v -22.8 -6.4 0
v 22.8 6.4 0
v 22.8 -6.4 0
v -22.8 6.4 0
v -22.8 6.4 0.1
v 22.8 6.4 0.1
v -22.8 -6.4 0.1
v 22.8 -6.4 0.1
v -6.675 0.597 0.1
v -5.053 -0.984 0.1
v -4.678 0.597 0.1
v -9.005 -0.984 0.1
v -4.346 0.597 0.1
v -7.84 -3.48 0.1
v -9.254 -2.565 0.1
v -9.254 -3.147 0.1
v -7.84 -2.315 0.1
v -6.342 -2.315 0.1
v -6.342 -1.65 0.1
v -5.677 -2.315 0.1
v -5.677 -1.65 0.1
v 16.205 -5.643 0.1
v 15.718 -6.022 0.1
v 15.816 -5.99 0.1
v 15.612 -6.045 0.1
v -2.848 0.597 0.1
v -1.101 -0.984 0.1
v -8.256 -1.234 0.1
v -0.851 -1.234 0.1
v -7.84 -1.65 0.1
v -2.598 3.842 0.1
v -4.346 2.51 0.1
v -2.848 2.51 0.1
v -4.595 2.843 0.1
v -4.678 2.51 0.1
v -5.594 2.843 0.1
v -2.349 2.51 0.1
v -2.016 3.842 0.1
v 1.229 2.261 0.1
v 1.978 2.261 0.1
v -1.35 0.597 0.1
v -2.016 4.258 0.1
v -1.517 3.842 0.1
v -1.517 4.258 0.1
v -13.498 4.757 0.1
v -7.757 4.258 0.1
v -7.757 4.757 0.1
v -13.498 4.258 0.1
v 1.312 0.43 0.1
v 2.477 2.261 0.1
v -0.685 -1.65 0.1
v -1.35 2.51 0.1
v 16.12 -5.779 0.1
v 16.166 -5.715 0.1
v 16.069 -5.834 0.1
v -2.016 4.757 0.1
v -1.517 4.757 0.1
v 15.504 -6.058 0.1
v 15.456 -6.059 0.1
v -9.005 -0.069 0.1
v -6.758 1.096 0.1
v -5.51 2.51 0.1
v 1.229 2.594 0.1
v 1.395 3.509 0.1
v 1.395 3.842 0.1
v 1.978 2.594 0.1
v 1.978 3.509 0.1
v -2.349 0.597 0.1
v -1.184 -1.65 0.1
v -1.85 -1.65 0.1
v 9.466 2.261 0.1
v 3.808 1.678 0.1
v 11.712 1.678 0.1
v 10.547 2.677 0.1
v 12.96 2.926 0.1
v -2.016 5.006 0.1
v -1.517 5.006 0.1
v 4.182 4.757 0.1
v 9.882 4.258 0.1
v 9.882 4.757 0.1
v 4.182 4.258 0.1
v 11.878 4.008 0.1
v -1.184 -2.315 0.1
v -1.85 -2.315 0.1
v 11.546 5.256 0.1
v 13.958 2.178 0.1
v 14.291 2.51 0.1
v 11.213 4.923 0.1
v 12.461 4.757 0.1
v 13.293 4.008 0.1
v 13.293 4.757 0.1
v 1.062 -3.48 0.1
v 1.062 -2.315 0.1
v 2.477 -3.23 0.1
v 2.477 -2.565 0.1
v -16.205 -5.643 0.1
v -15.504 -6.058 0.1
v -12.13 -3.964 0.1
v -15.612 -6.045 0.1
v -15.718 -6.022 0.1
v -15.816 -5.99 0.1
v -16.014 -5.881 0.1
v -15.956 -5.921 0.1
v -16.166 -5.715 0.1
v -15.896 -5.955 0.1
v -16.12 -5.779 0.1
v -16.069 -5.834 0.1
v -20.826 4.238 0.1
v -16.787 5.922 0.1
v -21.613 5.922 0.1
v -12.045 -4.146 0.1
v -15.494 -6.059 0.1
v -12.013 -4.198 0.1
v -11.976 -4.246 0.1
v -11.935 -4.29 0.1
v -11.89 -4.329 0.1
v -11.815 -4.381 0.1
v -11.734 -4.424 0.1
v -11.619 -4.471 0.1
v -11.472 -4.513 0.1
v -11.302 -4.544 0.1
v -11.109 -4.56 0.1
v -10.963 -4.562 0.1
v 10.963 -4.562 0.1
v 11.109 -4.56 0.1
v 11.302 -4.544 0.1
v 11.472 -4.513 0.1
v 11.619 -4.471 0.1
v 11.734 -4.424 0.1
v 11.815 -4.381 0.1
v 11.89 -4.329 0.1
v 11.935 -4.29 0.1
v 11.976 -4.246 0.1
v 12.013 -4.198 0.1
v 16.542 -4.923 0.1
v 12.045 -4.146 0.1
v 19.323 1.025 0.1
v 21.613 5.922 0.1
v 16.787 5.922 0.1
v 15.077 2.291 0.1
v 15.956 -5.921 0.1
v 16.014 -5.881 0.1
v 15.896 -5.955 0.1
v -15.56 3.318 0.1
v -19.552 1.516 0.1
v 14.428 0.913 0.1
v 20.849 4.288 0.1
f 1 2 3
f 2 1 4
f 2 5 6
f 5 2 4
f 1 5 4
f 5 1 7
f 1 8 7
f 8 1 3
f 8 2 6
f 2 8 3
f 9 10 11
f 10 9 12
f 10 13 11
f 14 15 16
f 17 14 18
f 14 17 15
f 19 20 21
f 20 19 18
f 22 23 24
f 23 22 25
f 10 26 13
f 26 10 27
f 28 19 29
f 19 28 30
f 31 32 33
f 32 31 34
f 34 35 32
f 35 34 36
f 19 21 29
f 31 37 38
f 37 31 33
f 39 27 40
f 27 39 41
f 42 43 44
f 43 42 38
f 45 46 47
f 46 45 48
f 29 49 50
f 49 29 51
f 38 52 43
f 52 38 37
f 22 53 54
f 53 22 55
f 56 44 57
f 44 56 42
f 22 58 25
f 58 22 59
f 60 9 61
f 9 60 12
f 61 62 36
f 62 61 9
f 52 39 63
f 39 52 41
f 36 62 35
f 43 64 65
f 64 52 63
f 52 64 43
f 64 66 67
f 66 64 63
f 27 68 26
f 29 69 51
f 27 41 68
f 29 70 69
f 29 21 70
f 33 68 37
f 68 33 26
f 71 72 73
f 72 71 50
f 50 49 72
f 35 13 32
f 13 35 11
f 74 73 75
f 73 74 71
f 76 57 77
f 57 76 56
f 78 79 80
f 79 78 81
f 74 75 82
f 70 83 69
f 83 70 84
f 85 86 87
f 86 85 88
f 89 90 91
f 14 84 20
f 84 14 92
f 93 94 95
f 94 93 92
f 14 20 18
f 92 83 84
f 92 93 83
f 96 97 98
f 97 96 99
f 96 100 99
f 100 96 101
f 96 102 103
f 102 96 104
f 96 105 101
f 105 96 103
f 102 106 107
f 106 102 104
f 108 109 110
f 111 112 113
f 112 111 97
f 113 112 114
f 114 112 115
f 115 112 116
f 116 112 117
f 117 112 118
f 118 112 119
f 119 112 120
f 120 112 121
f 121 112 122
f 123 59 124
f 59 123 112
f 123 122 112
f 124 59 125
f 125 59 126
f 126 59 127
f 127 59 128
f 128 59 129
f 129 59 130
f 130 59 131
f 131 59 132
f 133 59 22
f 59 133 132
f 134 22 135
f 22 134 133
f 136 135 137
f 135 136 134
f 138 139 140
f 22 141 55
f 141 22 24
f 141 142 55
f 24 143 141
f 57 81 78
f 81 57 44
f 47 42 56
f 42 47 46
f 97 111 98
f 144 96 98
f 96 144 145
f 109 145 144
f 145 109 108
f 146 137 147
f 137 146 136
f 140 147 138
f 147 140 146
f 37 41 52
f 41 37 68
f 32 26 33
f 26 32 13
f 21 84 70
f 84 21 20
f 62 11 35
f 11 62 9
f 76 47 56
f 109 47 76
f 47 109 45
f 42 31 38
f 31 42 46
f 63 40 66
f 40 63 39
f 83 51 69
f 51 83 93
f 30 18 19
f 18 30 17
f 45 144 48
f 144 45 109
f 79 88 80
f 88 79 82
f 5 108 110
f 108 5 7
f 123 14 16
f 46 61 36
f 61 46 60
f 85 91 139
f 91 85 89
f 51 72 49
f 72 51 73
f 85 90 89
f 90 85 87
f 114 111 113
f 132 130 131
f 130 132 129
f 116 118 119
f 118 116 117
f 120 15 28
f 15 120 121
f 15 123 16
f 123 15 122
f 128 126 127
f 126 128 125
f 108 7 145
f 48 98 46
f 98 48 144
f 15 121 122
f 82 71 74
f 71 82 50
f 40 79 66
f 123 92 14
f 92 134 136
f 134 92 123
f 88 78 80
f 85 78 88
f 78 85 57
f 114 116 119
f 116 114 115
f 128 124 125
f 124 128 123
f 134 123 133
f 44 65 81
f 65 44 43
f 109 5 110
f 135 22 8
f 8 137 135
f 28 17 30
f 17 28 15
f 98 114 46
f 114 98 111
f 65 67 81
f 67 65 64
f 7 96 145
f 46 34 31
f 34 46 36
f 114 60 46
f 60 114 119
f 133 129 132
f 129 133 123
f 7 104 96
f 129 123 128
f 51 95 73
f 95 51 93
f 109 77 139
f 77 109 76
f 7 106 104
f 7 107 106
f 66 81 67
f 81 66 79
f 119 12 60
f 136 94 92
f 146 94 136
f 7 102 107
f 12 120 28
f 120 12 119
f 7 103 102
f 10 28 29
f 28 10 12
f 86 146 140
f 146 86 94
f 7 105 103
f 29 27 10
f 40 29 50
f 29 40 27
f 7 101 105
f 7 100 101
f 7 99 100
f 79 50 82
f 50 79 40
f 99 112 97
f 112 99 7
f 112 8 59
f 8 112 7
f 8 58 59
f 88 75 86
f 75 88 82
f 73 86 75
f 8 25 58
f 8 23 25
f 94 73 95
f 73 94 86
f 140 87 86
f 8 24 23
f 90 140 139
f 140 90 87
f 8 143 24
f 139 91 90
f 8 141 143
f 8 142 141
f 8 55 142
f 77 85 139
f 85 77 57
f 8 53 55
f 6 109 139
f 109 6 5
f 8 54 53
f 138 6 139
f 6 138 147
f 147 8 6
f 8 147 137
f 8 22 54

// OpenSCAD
// file: ../p/box5-12.scad
use <../lib.scad>
function ldraw_lib__box5_12() = [
// 0 Box with 5 Faces without Any Edges
// 0 Name: box5-12.dat
// 0 Author: Chris Dee [cwdee]
// 0 !LDRAW_ORG Primitive UPDATE 2009-02
// 0 !LICENSE Licensed under CC BY 2.0 and CC BY 4.0 : see CAreadme.txt
// 
// 0 BFC CERTIFY CCW
  [0,"BFC","CERTIFY"],
  [0,"BFC","CCW"],
// 
// 0 !HISTORY 2009-09-03 [PTadmin] Official Update 2009-02
// 
// 
// 4 16 1 1 1 1 1 -1 -1 1 -1 -1 1 1
  [4,16,1,1,1,1,1,-1,-1,1,-1,-1,1,1],
// 4 16 -1 0 1 1 0 1 1 1 1 -1 1 1
  [4,16,-1,0,1,1,0,1,1,1,1,-1,1,1],
// 4 16 -1 0 -1 -1 0 1 -1 1 1 -1 1 -1
  [4,16,-1,0,-1,-1,0,1,-1,1,1,-1,1,-1],
// 4 16 1 0 -1 -1 0 -1 -1 1 -1 1 1 -1
  [4,16,1,0,-1,-1,0,-1,-1,1,-1,1,1,-1],
// 4 16 1 0 1 1 0 -1 1 1 -1 1 1 1
  [4,16,1,0,1,1,0,-1,1,1,-1,1,1,1],
// 0
];
module ldraw_lib__box5_12(step=0, col=false, unit=2/5, alt=false, line=0.2, solid=!$preview)
    makepoly(ldraw_lib__box5_12(), step=step, col=col, unit=unit, alt=alt, line=line, solid=solid);
ldraw_lib__box5_12(line=0.2);
// main file
use <../lib.scad>
use <../p/box5-12.scad>
function ldraw_lib__193445a() = [
// 0 Sticker  1.6 x  5.7 with Red Helicopter
// 0 Name: 193445a.dat
// 0 Author: Ulrich Röder [UR]
// 0 !LDRAW_ORG Part UPDATE 2018-02
// 0 !LICENSE Licensed under CC BY 2.0 and CC BY 4.0 : see CAreadme.txt
// 
// 0 BFC CERTIFY CCW
  [0,"BFC","CERTIFY"],
  [0,"BFC","CCW"],
// 
// 0 !KEYWORDS Set 5590
// 
// 0 !HISTORY 2018-12-08 [PTadmin] Official Update 2018-02
// 
// 
// 0 // Main
// 
// 1 16 0 -0.25 0 57 0 0 0 0.25 0 0 0 16 box5-12.dat
  [1,16,0,-0.25,0,57,0,0,0,0.25,0,0,0,16, ldraw_lib__box5_12()],
// 
// 0 // Red
// 4 4 -12.632 -.25 -2.46 -11.696 -.25 1.492 -16.688 -.25 1.492 -22.512 -.25 -2.46
  [4,4,-12.632,-.25,-2.46,-11.696,-.25,1.492,-16.688,-.25,1.492,-22.512,-.25,-2.46],
// 3 4 -12.632 -0.25 -2.46 -10.864 -0.25 1.492 -11.696 -0.25 1.492
  [3,4,-12.632,-0.25,-2.46,-10.864,-0.25,1.492,-11.696,-0.25,1.492],
// 3 4 -19.6 -0.25 -8.7 -23.136 -0.25 -6.412 -23.136 -0.25 -7.868
  [3,4,-19.6,-0.25,-8.7,-23.136,-0.25,-6.412,-23.136,-0.25,-7.868],
// 4 4 -19.6 -.25 -5.788 -23.136 -.25 -6.412 -19.6 -.25 -8.7 -15.856 -.25 -5.788
  [4,4,-19.6,-.25,-5.788,-23.136,-.25,-6.412,-19.6,-.25,-8.7,-15.856,-.25,-5.788],
// 4 4 -15.856 -.25 -5.788 -14.192 -.25 -5.788 -14.192 -.25 -4.124 -15.856 -.25 -4.124
  [4,4,-15.856,-.25,-5.788,-14.192,-.25,-5.788,-14.192,-.25,-4.124,-15.856,-.25,-4.124],
// 4 4 39.295 -.25 -15.056 39.539 -.25 -14.976 40.512 -.25 -14.108 39.029 -.25 -15.113
  [4,4,39.295,-.25,-15.056,39.539,-.25,-14.976,40.512,-.25,-14.108,39.029,-.25,-15.113],
// 4 4 -12.632 -.25 -2.46 -2.752 -.25 -2.46 -7.12 -.25 1.492 -10.864 -.25 1.492
  [4,4,-12.632,-.25,-2.46,-2.752,-.25,-2.46,-7.12,-.25,1.492,-10.864,-.25,1.492],
// 4 4 -15.856 -.25 -4.124 -2.128 -.25 -3.084 -20.64 -.25 -3.084 -19.6 -.25 -4.124
  [4,4,-15.856,-.25,-4.124,-2.128,-.25,-3.084,-20.64,-.25,-3.084,-19.6,-.25,-4.124],
// 4 4 -7.12 -.25 6.276 -6.496 -.25 9.604 -11.488 -.25 7.108 -10.864 -.25 6.276
  [4,4,-7.12,-.25,6.276,-6.496,-.25,9.604,-11.488,-.25,7.108,-10.864,-.25,6.276],
// 4 4 -11.696 -.25 6.276 -10.864 -.25 6.276 -11.488 -.25 7.108 -13.984 -.25 7.108
  [4,4,-11.696,-.25,6.276,-10.864,-.25,6.276,-11.488,-.25,7.108,-13.984,-.25,7.108],
// 3 4 -15.856 -0.25 -4.124 -14.192 -0.25 -4.124 -2.128 -0.25 -3.084
  [3,4,-15.856,-0.25,-4.124,-14.192,-0.25,-4.124,-2.128,-0.25,-3.084],
// 4 4 -6.496 -.25 9.604 -7.12 -.25 6.276 -5.872 -.25 6.276 -5.04 -.25 9.604
  [4,4,-6.496,-.25,9.604,-7.12,-.25,6.276,-5.872,-.25,6.276,-5.04,-.25,9.604],
// 4 4 3.072 -.25 5.652 -3.376 -.25 1.492 -2.752 -.25 -2.46 4.944 -.25 5.652
  [4,4,3.072,-.25,5.652,-3.376,-.25,1.492,-2.752,-.25,-2.46,4.944,-.25,5.652],
// 4 4 -5.04 -.25 9.604 -3.792 -.25 9.604 -3.792 -.25 10.644 -5.04 -.25 10.644
  [4,4,-5.04,-.25,9.604,-3.792,-.25,9.604,-3.792,-.25,10.644,-5.04,-.25,10.644],
// 4 4 -19.393 -.25 10.644 -19.393 -.25 11.892 -33.744 -.25 11.892 -33.744 -.25 10.644
  [4,4,-19.393,-.25,10.644,-19.393,-.25,11.892,-33.744,-.25,11.892,-33.744,-.25,10.644],
// 4 4 -2.128 -.25 -3.084 -1.712 -.25 -4.124 3.28 -.25 1.076 6.192 -.25 5.652
  [4,4,-2.128,-.25,-3.084,-1.712,-.25,-4.124,3.28,-.25,1.076,6.192,-.25,5.652],
// 4 4 -3.376 -.25 6.276 -3.792 -.25 9.604 -5.04 -.25 9.604 -5.872 -.25 6.276
  [4,4,-3.376,-.25,6.276,-3.792,-.25,9.604,-5.04,-.25,9.604,-5.872,-.25,6.276],
// 4 4 40.173 -.25 -14.584 40.3 -.25 -14.447 40.414 -.25 -14.288 40.512 -.25 -14.108
  [4,4,40.173,-.25,-14.584,40.3,-.25,-14.447,40.414,-.25,-14.288,40.512,-.25,-14.108],
// 4 4 -5.04 -.25 11.892 -5.04 -.25 10.644 -3.792 -.25 10.644 -3.792 -.25 11.892
  [4,4,-5.04,-.25,11.892,-5.04,-.25,10.644,-3.792,-.25,10.644,-3.792,-.25,11.892],
// 4 4 40.512 -.25 -14.108 38.64 -.25 -15.148 38.761 -.25 -15.144 39.029 -.25 -15.113
  [4,4,40.512,-.25,-14.108,38.64,-.25,-15.148,38.761,-.25,-15.144,39.029,-.25,-15.113],
// 4 4 -22.512 -.25 -.172 -22.512 -.25 -2.46 -16.688 -.25 1.492 -16.896 -.25 2.74
  [4,4,-22.512,-.25,-.172,-22.512,-.25,-2.46,-16.688,-.25,1.492,-16.896,-.25,2.74],
// 4 4 -13.776 -.25 6.276 -13.984 -.25 7.108 -16.896 -.25 2.74 -16.688 -.25 1.492
  [4,4,-13.776,-.25,6.276,-13.984,-.25,7.108,-16.896,-.25,2.74,-16.688,-.25,1.492],
// 4 4 3.072 -.25 5.652 3.072 -.25 6.484 -3.376 -.25 6.276 -3.376 -.25 1.492
  [4,4,3.072,-.25,5.652,3.072,-.25,6.484,-3.376,-.25,6.276,-3.376,-.25,1.492],
// 3 4 -13.984 -0.25 7.108 -13.776 -0.25 6.276 -11.696 -0.25 6.276
  [3,4,-13.984,-0.25,7.108,-13.776,-0.25,6.276,-11.696,-0.25,6.276],
// 3 4 -3.792 -0.25 9.604 3.488 -0.25 8.772 3.488 -0.25 9.604
  [3,4,-3.792,-0.25,9.604,3.488,-0.25,8.772,3.488,-0.25,9.604],
// 4 4 3.488 -.25 8.772 -3.792 -.25 9.604 -3.376 -.25 6.276 3.072 -.25 6.484
  [4,4,3.488,-.25,8.772,-3.792,-.25,9.604,-3.376,-.25,6.276,3.072,-.25,6.484],
// 4 4 4.944 -.25 6.484 4.944 -.25 8.772 3.488 -.25 8.772 3.072 -.25 6.484
  [4,4,4.944,-.25,6.484,4.944,-.25,8.772,3.488,-.25,8.772,3.072,-.25,6.484],
// 3 4 -2.752 -0.25 -2.46 -5.872 -0.25 1.492 -7.12 -0.25 1.492
  [3,4,-2.752,-0.25,-2.46,-5.872,-0.25,1.492,-7.12,-0.25,1.492],
// 3 4 -2.128 -0.25 -3.084 -2.96 -0.25 -4.124 -1.712 -0.25 -4.124
  [3,4,-2.128,-0.25,-3.084,-2.96,-0.25,-4.124,-1.712,-0.25,-4.124],
// 3 4 -2.752 -0.25 -2.46 -3.376 -0.25 1.492 -5.872 -0.25 1.492
  [3,4,-2.752,-0.25,-2.46,-3.376,-0.25,1.492,-5.872,-0.25,1.492],
// 3 4 -2.128 -0.25 -3.084 -4.624 -0.25 -4.124 -2.96 -0.25 -4.124
  [3,4,-2.128,-0.25,-3.084,-4.624,-0.25,-4.124,-2.96,-0.25,-4.124],
// 3 4 -2.128 -0.25 -3.084 -14.192 -0.25 -4.124 -4.624 -0.25 -4.124
  [3,4,-2.128,-0.25,-3.084,-14.192,-0.25,-4.124,-4.624,-0.25,-4.124],
// 4 4 -5.872 -.25 1.492 -5.872 -.25 6.276 -7.12 -.25 6.276 -7.12 -.25 1.492
  [4,4,-5.872,-.25,1.492,-5.872,-.25,6.276,-7.12,-.25,6.276,-7.12,-.25,1.492],
// 4 4 29.28 -.25 4.196 23.664 -.25 5.652 6.192 -.25 5.652 9.52 -.25 4.196
  [4,4,29.28,-.25,4.196,23.664,-.25,5.652,6.192,-.25,5.652,9.52,-.25,4.196],
// 3 4 6.192 -0.25 5.652 3.28 -0.25 1.076 9.52 -0.25 4.196
  [3,4,6.192,-0.25,5.652,3.28,-0.25,1.076,9.52,-0.25,4.196],
// 4 4 -11.696 -.25 6.276 -11.696 -.25 1.492 -10.864 -.25 1.492 -10.864 -.25 6.276
  [4,4,-11.696,-.25,6.276,-11.696,-.25,1.492,-10.864,-.25,1.492,-10.864,-.25,6.276],
// 4 4 26.368 -.25 6.692 23.664 -.25 5.652 29.28 -.25 4.196 32.4 -.25 7.316
  [4,4,26.368,-.25,6.692,23.664,-.25,5.652,29.28,-.25,4.196,32.4,-.25,7.316],
// 4 4 -5.04 -.25 11.892 -3.792 -.25 11.892 -3.792 -.25 12.516 -5.04 -.25 12.516
  [4,4,-5.04,-.25,11.892,-3.792,-.25,11.892,-3.792,-.25,12.516,-5.04,-.25,12.516],
// 4 4 10.456 -.25 11.892 10.456 -.25 10.644 24.704 -.25 10.644 24.704 -.25 11.892
  [4,4,10.456,-.25,11.892,10.456,-.25,10.644,24.704,-.25,10.644,24.704,-.25,11.892],
// 3 4 26.368 -0.25 6.692 32.4 -0.25 7.316 29.696 -0.25 10.02
  [3,4,26.368,-0.25,6.692,32.4,-0.25,7.316,29.696,-0.25,10.02],
// 4 4 -2.96 -.25 -4.124 -4.624 -.25 -4.124 -4.624 -.25 -5.788 -2.96 -.25 -5.788
  [4,4,-2.96,-.25,-4.124,-4.624,-.25,-4.124,-4.624,-.25,-5.788,-2.96,-.25,-5.788],
// 4 4 34.896 -.25 5.444 35.728 -.25 6.276 28.864 -.25 13.14 28.032 -.25 12.308
  [4,4,34.896,-.25,5.444,35.728,-.25,6.276,28.864,-.25,13.14,28.032,-.25,12.308],
// 3 4 31.152 -0.25 11.892 33.232 -0.25 10.02 33.232 -0.25 11.892
  [3,4,31.152,-0.25,11.892,33.232,-0.25,10.02,33.232,-0.25,11.892],
// 4 4 -4.624 -.25 -5.788 -14.192 -.25 -5.788 -19.6 -.25 -8.7 2.656 -.25 -8.7
  [4,4,-4.624,-.25,-5.788,-14.192,-.25,-5.788,-19.6,-.25,-8.7,2.656,-.25,-8.7],
// 4 4 6.192 -.25 -6.412 2.656 -.25 -5.788 2.656 -.25 -8.7 6.192 -.25 -8.076
  [4,4,6.192,-.25,-6.412,2.656,-.25,-5.788,2.656,-.25,-8.7,6.192,-.25,-8.076],
// 3 4 -19.6 -0.25 -8.7 -14.192 -0.25 -5.788 -15.856 -0.25 -5.788
  [3,4,-19.6,-0.25,-8.7,-14.192,-0.25,-5.788,-15.856,-0.25,-5.788],
// 3 4 2.656 -0.25 -8.7 -2.96 -0.25 -5.788 -4.624 -0.25 -5.788
  [3,4,2.656,-0.25,-8.7,-2.96,-0.25,-5.788,-4.624,-0.25,-5.788],
// 3 4 2.656 -0.25 -8.7 2.656 -0.25 -5.788 -2.96 -0.25 -5.788
  [3,4,2.656,-0.25,-8.7,2.656,-0.25,-5.788,-2.96,-0.25,-5.788],
// 4 4 -30.325 -.25 -9.911 -40.512 -.25 -14.108 -39.029 -.25 -15.113 -38.761 -.25 -15.144
  [4,4,-30.325,-.25,-9.911,-40.512,-.25,-14.108,-39.029,-.25,-15.113,-38.761,-.25,-15.144],
// 4 4 -39.029 -.25 -15.113 -40.512 -.25 -14.108 -39.539 -.25 -14.976 -39.295 -.25 -15.056
  [4,4,-39.029,-.25,-15.113,-40.512,-.25,-14.108,-39.539,-.25,-14.976,-39.295,-.25,-15.056],
// 4 4 -40.414 -.25 -14.288 -40.035 -.25 -14.702 -39.89 -.25 -14.803 -40.512 -.25 -14.108
  [4,4,-40.414,-.25,-14.288,-40.035,-.25,-14.702,-39.89,-.25,-14.803,-40.512,-.25,-14.108],
// 4 4 -39.539 -.25 -14.976 -40.512 -.25 -14.108 -39.89 -.25 -14.803 -39.74 -.25 -14.887
  [4,4,-39.539,-.25,-14.976,-40.512,-.25,-14.108,-39.89,-.25,-14.803,-39.74,-.25,-14.887],
// 4 4 -40.173 -.25 -14.584 -40.035 -.25 -14.702 -40.414 -.25 -14.288 -40.3 -.25 -14.447
  [4,4,-40.173,-.25,-14.584,-40.035,-.25,-14.702,-40.414,-.25,-14.288,-40.3,-.25,-14.447],
// 3 4 -52.064 -0.25 10.596 -41.968 -0.25 14.804 -54.032 -0.25 14.804
  [3,4,-52.064,-0.25,10.596,-41.968,-0.25,14.804,-54.032,-0.25,14.804],
// 4 4 -38.736 -.25 -15.148 -30.033 -.25 -10.495 -30.112 -.25 -10.364 -38.761 -.25 -15.144
  [4,4,-38.736,-.25,-15.148,-30.033,-.25,-10.495,-30.112,-.25,-10.364,-38.761,-.25,-15.144],
// 3 4 -30.033 -0.25 -10.495 -38.736 -0.25 -15.148 -29.941 -0.25 -10.615
  [3,4,-30.033,-0.25,-10.495,-38.736,-0.25,-15.148,-29.941,-0.25,-10.615],
// 3 4 -29.941 -0.25 -10.615 -38.736 -0.25 -15.148 -29.838 -0.25 -10.724
  [3,4,-29.941,-0.25,-10.615,-38.736,-0.25,-15.148,-29.838,-0.25,-10.724],
// 3 4 -29.838 -0.25 -10.724 -38.736 -0.25 -15.148 -29.724 -0.25 -10.823
  [3,4,-29.838,-0.25,-10.724,-38.736,-0.25,-15.148,-29.724,-0.25,-10.823],
// 3 4 -29.724 -0.25 -10.823 -38.736 -0.25 -15.148 -29.537 -0.25 -10.952
  [3,4,-29.724,-0.25,-10.823,-38.736,-0.25,-15.148,-29.537,-0.25,-10.952],
// 3 4 -29.537 -0.25 -10.952 -38.736 -0.25 -15.148 -29.334 -0.25 -11.061
  [3,4,-29.537,-0.25,-10.952,-38.736,-0.25,-15.148,-29.334,-0.25,-11.061],
// 3 4 -29.334 -0.25 -11.061 -38.736 -0.25 -15.148 -29.048 -0.25 -11.177
  [3,4,-29.334,-0.25,-11.061,-38.736,-0.25,-15.148,-29.048,-0.25,-11.177],
// 3 4 -29.048 -0.25 -11.177 -38.736 -0.25 -15.148 -28.681 -0.25 -11.282
  [3,4,-29.048,-0.25,-11.177,-38.736,-0.25,-15.148,-28.681,-0.25,-11.282],
// 3 4 -28.681 -0.25 -11.282 -38.736 -0.25 -15.148 -28.255 -0.25 -11.359
  [3,4,-28.681,-0.25,-11.282,-38.736,-0.25,-15.148,-28.255,-0.25,-11.359],
// 3 4 -28.255 -0.25 -11.359 -38.736 -0.25 -15.148 -27.772 -0.25 -11.401
  [3,4,-28.255,-0.25,-11.359,-38.736,-0.25,-15.148,-27.772,-0.25,-11.401],
// 4 4 27.408 -.25 -11.404 -27.408 -.25 -11.404 -38.736 -.25 -15.148 38.64 -.25 -15.148
  [4,4,27.408,-.25,-11.404,-27.408,-.25,-11.404,-38.736,-.25,-15.148,38.64,-.25,-15.148],
// 3 4 -27.408 -.25 -11.404 -27.772 -.25 -11.401 -38.736 -.25 -15.148
  [3,4,-27.408,-.25,-11.404,-27.772,-.25,-11.401,-38.736,-.25,-15.148],
// 3 4 27.408 -0.25 -11.404 38.64 -0.25 -15.148 27.772 -0.25 -11.401
  [3,4,27.408,-0.25,-11.404,38.64,-0.25,-15.148,27.772,-0.25,-11.401],
// 3 4 27.772 -0.25 -11.401 38.64 -0.25 -15.148 28.255 -0.25 -11.359
  [3,4,27.772,-0.25,-11.401,38.64,-0.25,-15.148,28.255,-0.25,-11.359],
// 3 4 28.255 -0.25 -11.359 38.64 -0.25 -15.148 28.681 -0.25 -11.282
  [3,4,28.255,-0.25,-11.359,38.64,-0.25,-15.148,28.681,-0.25,-11.282],
// 3 4 28.681 -0.25 -11.282 38.64 -0.25 -15.148 29.048 -0.25 -11.177
  [3,4,28.681,-0.25,-11.282,38.64,-0.25,-15.148,29.048,-0.25,-11.177],
// 3 4 29.048 -0.25 -11.177 38.64 -0.25 -15.148 29.334 -0.25 -11.061
  [3,4,29.048,-0.25,-11.177,38.64,-0.25,-15.148,29.334,-0.25,-11.061],
// 3 4 29.334 -0.25 -11.061 38.64 -0.25 -15.148 29.537 -0.25 -10.952
  [3,4,29.334,-0.25,-11.061,38.64,-0.25,-15.148,29.537,-0.25,-10.952],
// 3 4 29.537 -0.25 -10.952 38.64 -0.25 -15.148 29.724 -0.25 -10.823
  [3,4,29.537,-0.25,-10.952,38.64,-0.25,-15.148,29.724,-0.25,-10.823],
// 3 4 29.724 -0.25 -10.823 38.64 -0.25 -15.148 29.838 -0.25 -10.724
  [3,4,29.724,-0.25,-10.823,38.64,-0.25,-15.148,29.838,-0.25,-10.724],
// 4 4 40.512 -.25 -14.108 29.941 -.25 -10.615 29.838 -.25 -10.724 38.64 -.25 -15.148
  [4,4,40.512,-.25,-14.108,29.941,-.25,-10.615,29.838,-.25,-10.724,38.64,-.25,-15.148],
// 4 4 41.354 -.25 -12.307 30.033 -.25 -10.495 29.941 -.25 -10.615 40.512 -.25 -14.108
  [4,4,41.354,-.25,-12.307,30.033,-.25,-10.495,29.941,-.25,-10.615,40.512,-.25,-14.108],
// 4 4 48.308 -.25 2.563 30.112 -.25 -10.364 30.033 -.25 -10.495 41.354 -.25 -12.307
  [4,4,48.308,-.25,2.563,30.112,-.25,-10.364,30.033,-.25,-10.495,41.354,-.25,-12.307],
// 3 4 54.032 -.25 14.804 41.968 -.25 14.804 37.692 -.25 5.728
  [3,4,54.032,-.25,14.804,41.968,-.25,14.804,37.692,-.25,5.728],
// 4 4 39.539 -.25 -14.976 39.89 -.25 -14.803 40.173 -.25 -14.584 40.512 -.25 -14.108
  [4,4,39.539,-.25,-14.976,39.89,-.25,-14.803,40.173,-.25,-14.584,40.512,-.25,-14.108],
// 3 4 39.89 -.25 -14.803 40.035 -.25 -14.702 40.173 -.25 -14.584
  [3,4,39.89,-.25,-14.803,40.035,-.25,-14.702,40.173,-.25,-14.584],
// 3 4 39.539 -.25 -14.976 39.74 -.25 -14.887 39.89 -.25 -14.803
  [3,4,39.539,-.25,-14.976,39.74,-.25,-14.887,39.89,-.25,-14.803],
// 4 4 -3.792 -.25 11.892 -3.792 -.25 10.644 10.456 -.25 10.644 10.456 -.25 11.892
  [4,4,-3.792,-.25,11.892,-3.792,-.25,10.644,10.456,-.25,10.644,10.456,-.25,11.892],
// 4 4 -5.04 -.25 10.644 -5.04 -.25 11.892 -19.393 -.25 11.892 -19.393 -.25 10.644
  [4,4,-5.04,-.25,10.644,-5.04,-.25,11.892,-19.393,-.25,11.892,-19.393,-.25,10.644],
// 3 4 -38.761 -.25 -15.144 -30.112 -.25 -10.364 -30.325 -.25 -9.911
  [3,4,-38.761,-.25,-15.144,-30.112,-.25,-10.364,-30.325,-.25,-9.911],
// 4 4 -40.512 -.25 -14.108 -30.325 -.25 -9.911 -38.901 -.25 8.294 -48.881 -.25 3.79
  [4,4,-40.512,-.25,-14.108,-30.325,-.25,-9.911,-38.901,-.25,8.294,-48.881,-.25,3.79],
// 4 4 -48.881 -.25 3.79 -38.901 -.25 8.294 -41.968 -.25 14.804 -52.064 -.25 10.596
  [4,4,-48.881,-.25,3.79,-38.901,-.25,8.294,-41.968,-.25,14.804,-52.064,-.25,10.596],
// 4 4 30.112 -.25 -10.364 48.308 -.25 2.563 52.123 -.25 10.721 36.07 -.25 2.283
  [4,4,30.112,-.25,-10.364,48.308,-.25,2.563,52.123,-.25,10.721,36.07,-.25,2.283],
// 4 4 54.032 -.25 14.804 37.692 -.25 5.728 36.07 -.25 2.283 52.123 -.25 10.721
  [4,4,54.032,-.25,14.804,37.692,-.25,5.728,36.07,-.25,2.283,52.123,-.25,10.721],
// 
// 0 // Black
// 4 0 -3.376 -0.25 6.276 -5.872 -0.25 6.276 -5.872 -0.25 1.492 -3.376 -0.25 1.492
  [4,0,-3.376,-0.25,6.276,-5.872,-0.25,6.276,-5.872,-0.25,1.492,-3.376,-0.25,1.492],
// 4 0 -7.12 -0.25 6.276 -10.864 -0.25 6.276 -10.864 -0.25 1.492 -7.12 -0.25 1.492
  [4,0,-7.12,-0.25,6.276,-10.864,-0.25,6.276,-10.864,-0.25,1.492,-7.12,-0.25,1.492],
// 4 0 -4.624 -0.25 -5.788 -4.624 -0.25 -4.124 -14.192 -0.25 -4.124 -14.192 -0.25 -5.788
  [4,0,-4.624,-0.25,-5.788,-4.624,-0.25,-4.124,-14.192,-0.25,-4.124,-14.192,-0.25,-5.788],
// 4 0 -11.696 -0.25 1.492 -11.696 -0.25 6.276 -13.776 -0.25 6.276 -16.688 -0.25 1.492
  [4,0,-11.696,-0.25,1.492,-11.696,-0.25,6.276,-13.776,-0.25,6.276,-16.688,-0.25,1.492],
// 3 0 -5.04 -0.25 12.516 -19.393 -0.25 11.892 -5.04 -0.25 11.892
  [3,0,-5.04,-0.25,12.516,-19.393,-0.25,11.892,-5.04,-0.25,11.892],
// 4 0 -33.744 -0.25 11.892 -19.393 -0.25 11.892 -5.04 -0.25 12.516 -41.968 -0.25 14.804
  [4,0,-33.744,-0.25,11.892,-19.393,-0.25,11.892,-5.04,-0.25,12.516,-41.968,-0.25,14.804],
// 4 0 -5.04 -0.25 10.644 -19.393 -0.25 10.644 -6.496 -0.25 9.604 -5.04 -0.25 9.604
  [4,0,-5.04,-0.25,10.644,-19.393,-0.25,10.644,-6.496,-0.25,9.604,-5.04,-0.25,9.604],
// 4 0 4.944 -0.25 5.652 4.944 -0.25 6.484 3.072 -0.25 6.484 3.072 -0.25 5.652
  [4,0,4.944,-0.25,5.652,4.944,-0.25,6.484,3.072,-0.25,6.484,3.072,-0.25,5.652],
// 4 0 2.656 -0.25 -5.788 -1.712 -0.25 -4.124 -2.96 -0.25 -4.124 -2.96 -0.25 -5.788
  [4,0,2.656,-0.25,-5.788,-1.712,-0.25,-4.124,-2.96,-0.25,-4.124,-2.96,-0.25,-5.788],
// 4 0 -15.856 -0.25 -5.788 -15.856 -0.25 -4.124 -19.6 -0.25 -4.124 -19.6 -0.25 -5.788
  [4,0,-15.856,-0.25,-5.788,-15.856,-0.25,-4.124,-19.6,-0.25,-4.124,-19.6,-0.25,-5.788],
// 4 0 -38.901 -0.25 8.294 -33.744 -0.25 10.644 -33.744 -0.25 11.892 -41.968 -0.25 14.804
  [4,0,-38.901,-0.25,8.294,-33.744,-0.25,10.644,-33.744,-0.25,11.892,-41.968,-0.25,14.804],
// 4 0 24.704 -0.25 11.892 24.704 -0.25 10.644 29.696 -0.25 10.02 28.032 -0.25 12.308
  [4,0,24.704,-0.25,11.892,24.704,-0.25,10.644,29.696,-0.25,10.02,28.032,-0.25,12.308],
// 4 0 -57 -0.25 16 -57 -0.25 -16 -52.064 -0.25 10.596 -54.032 -0.25 14.804
  [4,0,-57,-0.25,16,-57,-0.25,-16,-52.064,-0.25,10.596,-54.032,-0.25,14.804],
// 3 0 -27.408 -0.25 -11.404 -19.6 -0.25 -8.7 -23.136 -0.25 -7.868
  [3,0,-27.408,-0.25,-11.404,-19.6,-0.25,-8.7,-23.136,-0.25,-7.868],
// 4 0 -19.393 -0.25 10.644 -22.512 -0.25 -0.172 -16.896 -0.25 2.74 -13.984 -0.25 7.108
  [4,0,-19.393,-0.25,10.644,-22.512,-0.25,-0.172,-16.896,-0.25,2.74,-13.984,-0.25,7.108],
// 4 0 41.968 -0.25 14.804 28.864 -0.25 13.14 31.152 -0.25 11.892 33.232 -0.25 11.892
  [4,0,41.968,-0.25,14.804,28.864,-0.25,13.14,31.152,-0.25,11.892,33.232,-0.25,11.892],
// 4 0 -1.712 -0.25 -4.124 29.28 -0.25 4.196 9.52 -0.25 4.196 3.28 -0.25 1.076
  [4,0,-1.712,-0.25,-4.124,29.28,-0.25,4.196,9.52,-0.25,4.196,3.28,-0.25,1.076],
// 4 0 33.232 -0.25 10.02 31.152 -0.25 11.892 28.864 -0.25 13.14 35.728 -0.25 6.276
  [4,0,33.232,-0.25,10.02,31.152,-0.25,11.892,28.864,-0.25,13.14,35.728,-0.25,6.276],
// 3 0 -29.941 -0.25 -10.615 -30.112 -0.25 -10.364 -30.033 -0.25 -10.495
  [3,0,-29.941,-0.25,-10.615,-30.112,-0.25,-10.364,-30.033,-0.25,-10.495],
// 4 0 29.334 -0.25 -11.061 29.537 -0.25 -10.952 29.724 -0.25 -10.823 29.838 -0.25 -10.724
  [4,0,29.334,-0.25,-11.061,29.537,-0.25,-10.952,29.724,-0.25,-10.823,29.838,-0.25,-10.724],
// 4 0 -29.334 -0.25 -11.061 -29.048 -0.25 -11.177 -29.724 -0.25 -10.823 -29.537 -0.25 -10.952
  [4,0,-29.334,-0.25,-11.061,-29.048,-0.25,-11.177,-29.724,-0.25,-10.823,-29.537,-0.25,-10.952],
// 4 0 -28.681 -0.25 -11.282 -28.255 -0.25 -11.359 -23.136 -0.25 -6.412 -20.64 -0.25 -3.084
  [4,0,-28.681,-0.25,-11.282,-28.255,-0.25,-11.359,-23.136,-0.25,-6.412,-20.64,-0.25,-3.084],
// 4 0 -23.136 -0.25 -7.868 -23.136 -0.25 -6.412 -27.772 -0.25 -11.401 -27.408 -0.25 -11.404
  [4,0,-23.136,-0.25,-7.868,-23.136,-0.25,-6.412,-27.772,-0.25,-11.401,-27.408,-0.25,-11.404],
// 4 0 28.681 -0.25 -11.282 29.048 -0.25 -11.177 27.772 -0.25 -11.401 28.255 -0.25 -11.359
  [4,0,28.681,-0.25,-11.282,29.048,-0.25,-11.177,27.772,-0.25,-11.401,28.255,-0.25,-11.359],
// 3 0 -52.064 -0.25 10.596 -57 -0.25 -16 -48.881 -0.25 3.79
  [3,0,-52.064,-0.25,10.596,-57,-0.25,-16,-48.881,-0.25,3.79],
// 4 0 -38.901 -0.25 8.294 -30.325 -0.25 -9.911 -19.393 -0.25 10.644 -33.744 -0.25 10.644
  [4,0,-38.901,-0.25,8.294,-30.325,-0.25,-9.911,-19.393,-0.25,10.644,-33.744,-0.25,10.644],
// 3 0 -23.136 -0.25 -6.412 -28.255 -0.25 -11.359 -27.772 -0.25 -11.401
  [3,0,-23.136,-0.25,-6.412,-28.255,-0.25,-11.359,-27.772,-0.25,-11.401],
// 4 0 29.696 -0.25 10.02 6.192 -0.25 5.652 23.664 -0.25 5.652 26.368 -0.25 6.692
  [4,0,29.696,-0.25,10.02,6.192,-0.25,5.652,23.664,-0.25,5.652,26.368,-0.25,6.692],
// 3 0 4.944 -0.25 5.652 24.704 -0.25 10.644 4.944 -0.25 6.484
  [3,0,4.944,-0.25,5.652,24.704,-0.25,10.644,4.944,-0.25,6.484],
// 3 0 -27.408 -0.25 -11.404 2.656 -0.25 -8.7 -19.6 -0.25 -8.7
  [3,0,-27.408,-0.25,-11.404,2.656,-0.25,-8.7,-19.6,-0.25,-8.7],
// 4 0 30.033 -0.25 -10.495 30.112 -0.25 -10.364 2.656 -0.25 -8.7 -27.408 -0.25 -11.404
  [4,0,30.033,-0.25,-10.495,30.112,-0.25,-10.364,2.656,-0.25,-8.7,-27.408,-0.25,-11.404],
// 3 0 28.032 -0.25 12.308 10.456 -0.25 11.892 24.704 -0.25 11.892
  [3,0,28.032,-0.25,12.308,10.456,-0.25,11.892,24.704,-0.25,11.892],
// 4 0 -3.792 -0.25 11.892 10.456 -0.25 11.892 28.032 -0.25 12.308 28.864 -0.25 13.14
  [4,0,-3.792,-0.25,11.892,10.456,-0.25,11.892,28.032,-0.25,12.308,28.864,-0.25,13.14],
// 4 0 -29.941 -0.25 -10.615 -29.838 -0.25 -10.724 -29.724 -0.25 -10.823 -29.048 -0.25 -11.177
  [4,0,-29.941,-0.25,-10.615,-29.838,-0.25,-10.724,-29.724,-0.25,-10.823,-29.048,-0.25,-11.177],
// 4 0 27.408 -0.25 -11.404 27.772 -0.25 -11.401 29.048 -0.25 -11.177 -27.408 -0.25 -11.404
  [4,0,27.408,-0.25,-11.404,27.772,-0.25,-11.401,29.048,-0.25,-11.177,-27.408,-0.25,-11.404],
// 3 0 30.033 -0.25 -10.495 -27.408 -0.25 -11.404 29.941 -0.25 -10.615
  [3,0,30.033,-0.25,-10.495,-27.408,-0.25,-11.404,29.941,-0.25,-10.615],
// 4 0 -3.792 -0.25 10.644 -3.792 -0.25 9.604 3.488 -0.25 9.604 10.456 -0.25 10.644
  [4,0,-3.792,-0.25,10.644,-3.792,-0.25,9.604,3.488,-0.25,9.604,10.456,-0.25,10.644],
// 3 0 -41.968 -0.25 14.804 -57 -0.25 16 -54.032 -0.25 14.804
  [3,0,-41.968,-0.25,14.804,-57,-0.25,16,-54.032,-0.25,14.804],
// 3 0 41.354 -0.25 -12.307 40.512 -0.25 -14.108 57 -0.25 -16
  [3,0,41.354,-0.25,-12.307,40.512,-0.25,-14.108,57,-0.25,-16],
// 3 0 57 -0.25 -16 48.308 -0.25 2.563 41.354 -0.25 -12.307
  [3,0,57,-0.25,-16,48.308,-0.25,2.563,41.354,-0.25,-12.307],
// 4 0 -19.6 -0.25 -5.788 -19.6 -0.25 -4.124 -20.64 -0.25 -3.084 -23.136 -0.25 -6.412
  [4,0,-19.6,-0.25,-5.788,-19.6,-0.25,-4.124,-20.64,-0.25,-3.084,-23.136,-0.25,-6.412],
// 4 0 -29.941 -0.25 -10.615 -19.393 -0.25 10.644 -30.325 -0.25 -9.911 -30.112 -0.25 -10.364
  [4,0,-29.941,-0.25,-10.615,-19.393,-0.25,10.644,-30.325,-0.25,-9.911,-30.112,-0.25,-10.364],
// 4 0 4.944 -0.25 8.772 10.456 -0.25 10.644 3.488 -0.25 9.604 3.488 -0.25 8.772
  [4,0,4.944,-0.25,8.772,10.456,-0.25,10.644,3.488,-0.25,9.604,3.488,-0.25,8.772],
// 3 0 -57 -0.25 -16 -40.512 -0.25 -14.108 -48.881 -0.25 3.79
  [3,0,-57,-0.25,-16,-40.512,-0.25,-14.108,-48.881,-0.25,3.79],
// 4 0 -6.496 -0.25 9.604 -19.393 -0.25 10.644 -13.984 -0.25 7.108 -11.488 -0.25 7.108
  [4,0,-6.496,-0.25,9.604,-19.393,-0.25,10.644,-13.984,-0.25,7.108,-11.488,-0.25,7.108],
// 4 0 -29.941 -0.25 -10.615 -29.048 -0.25 -11.177 -22.512 -0.25 -0.172 -19.393 -0.25 10.644
  [4,0,-29.941,-0.25,-10.615,-29.048,-0.25,-11.177,-22.512,-0.25,-0.172,-19.393,-0.25,10.644],
// 4 0 29.334 -0.25 -11.061 29.838 -0.25 -10.724 29.941 -0.25 -10.615 -27.408 -0.25 -11.404
  [4,0,29.334,-0.25,-11.061,29.838,-0.25,-10.724,29.941,-0.25,-10.615,-27.408,-0.25,-11.404],
// 3 0 -57 -0.25 -16 -40.414 -0.25 -14.288 -40.512 -0.25 -14.108
  [3,0,-57,-0.25,-16,-40.414,-0.25,-14.288,-40.512,-0.25,-14.108],
// 3 0 29.334 -0.25 -11.061 -27.408 -0.25 -11.404 29.048 -0.25 -11.177
  [3,0,29.334,-0.25,-11.061,-27.408,-0.25,-11.404,29.048,-0.25,-11.177],
// 4 0 -1.712 -0.25 -4.124 2.656 -0.25 -5.788 6.192 -0.25 -6.412 29.28 -0.25 4.196
  [4,0,-1.712,-0.25,-4.124,2.656,-0.25,-5.788,6.192,-0.25,-6.412,29.28,-0.25,4.196],
// 4 0 41.968 -0.25 14.804 -41.968 -0.25 14.804 -5.04 -0.25 12.516 -3.792 -0.25 12.516
  [4,0,41.968,-0.25,14.804,-41.968,-0.25,14.804,-5.04,-0.25,12.516,-3.792,-0.25,12.516],
// 3 0 -57 -0.25 -16 -40.3 -0.25 -14.447 -40.414 -0.25 -14.288
  [3,0,-57,-0.25,-16,-40.3,-0.25,-14.447,-40.414,-0.25,-14.288],
// 3 0 -57 -0.25 -16 -40.173 -0.25 -14.584 -40.3 -0.25 -14.447
  [3,0,-57,-0.25,-16,-40.173,-0.25,-14.584,-40.3,-0.25,-14.447],
// 4 0 4.944 -0.25 6.484 24.704 -0.25 10.644 10.456 -0.25 10.644 4.944 -0.25 8.772
  [4,0,4.944,-0.25,6.484,24.704,-0.25,10.644,10.456,-0.25,10.644,4.944,-0.25,8.772],
// 3 0 -29.048 -0.25 -11.177 -22.512 -0.25 -2.46 -22.512 -0.25 -0.172
  [3,0,-29.048,-0.25,-11.177,-22.512,-0.25,-2.46,-22.512,-0.25,-0.172],
// 3 0 30.112 -0.25 -10.364 6.192 -0.25 -8.076 2.656 -0.25 -8.7
  [3,0,30.112,-0.25,-10.364,6.192,-0.25,-8.076,2.656,-0.25,-8.7],
// 3 0 36.07 -0.25 2.283 6.192 -0.25 -8.076 30.112 -0.25 -10.364
  [3,0,36.07,-0.25,2.283,6.192,-0.25,-8.076,30.112,-0.25,-10.364],
// 3 0 -57 -0.25 -16 -40.035 -0.25 -14.702 -40.173 -0.25 -14.584
  [3,0,-57,-0.25,-16,-40.035,-0.25,-14.702,-40.173,-0.25,-14.584],
// 4 0 -22.512 -0.25 -2.46 -29.048 -0.25 -11.177 -28.681 -0.25 -11.282 -20.64 -0.25 -3.084
  [4,0,-22.512,-0.25,-2.46,-29.048,-0.25,-11.177,-28.681,-0.25,-11.282,-20.64,-0.25,-3.084],
// 3 0 -57 -0.25 -16 -39.89 -0.25 -14.803 -40.035 -0.25 -14.702
  [3,0,-57,-0.25,-16,-39.89,-0.25,-14.803,-40.035,-0.25,-14.702],
// 4 0 -20.64 -0.25 -3.084 -2.128 -0.25 -3.084 -12.632 -0.25 -2.46 -22.512 -0.25 -2.46
  [4,0,-20.64,-0.25,-3.084,-2.128,-0.25,-3.084,-12.632,-0.25,-2.46,-22.512,-0.25,-2.46],
// 4 0 36.07 -0.25 2.283 37.692 -0.25 5.728 34.896 -0.25 5.444 6.192 -0.25 -8.076
  [4,0,36.07,-0.25,2.283,37.692,-0.25,5.728,34.896,-0.25,5.444,6.192,-0.25,-8.076],
// 3 0 -57 -0.25 -16 -39.74 -0.25 -14.887 -39.89 -0.25 -14.803
  [3,0,-57,-0.25,-16,-39.74,-0.25,-14.887,-39.89,-0.25,-14.803],
// 3 0 -2.128 -0.25 -3.084 -2.752 -0.25 -2.46 -12.632 -0.25 -2.46
  [3,0,-2.128,-0.25,-3.084,-2.752,-0.25,-2.46,-12.632,-0.25,-2.46],
// 4 0 -2.128 -0.25 -3.084 6.192 -0.25 5.652 4.944 -0.25 5.652 -2.752 -0.25 -2.46
  [4,0,-2.128,-0.25,-3.084,6.192,-0.25,5.652,4.944,-0.25,5.652,-2.752,-0.25,-2.46],
// 3 0 -57 -0.25 -16 -39.539 -0.25 -14.976 -39.74 -0.25 -14.887
  [3,0,-57,-0.25,-16,-39.539,-0.25,-14.976,-39.74,-0.25,-14.887],
// 3 0 -57 -0.25 -16 -39.295 -0.25 -15.056 -39.539 -0.25 -14.976
  [3,0,-57,-0.25,-16,-39.295,-0.25,-15.056,-39.539,-0.25,-14.976],
// 3 0 -57 -0.25 -16 -39.029 -0.25 -15.113 -39.295 -0.25 -15.056
  [3,0,-57,-0.25,-16,-39.029,-0.25,-15.113,-39.295,-0.25,-15.056],
// 4 0 29.696 -0.25 10.02 24.704 -0.25 10.644 4.944 -0.25 5.652 6.192 -0.25 5.652
  [4,0,29.696,-0.25,10.02,24.704,-0.25,10.644,4.944,-0.25,5.652,6.192,-0.25,5.652],
// 4 0 -39.029 -0.25 -15.113 -57 -0.25 -16 -38.736 -0.25 -15.148 -38.761 -0.25 -15.144
  [4,0,-39.029,-0.25,-15.113,-57,-0.25,-16,-38.736,-0.25,-15.148,-38.761,-0.25,-15.144],
// 4 0 -38.736 -0.25 -15.148 -57 -0.25 -16 57 -0.25 -16 38.64 -0.25 -15.148
  [4,0,-38.736,-0.25,-15.148,-57,-0.25,-16,57,-0.25,-16,38.64,-0.25,-15.148],
// 3 0 57 -0.25 -16 38.761 -0.25 -15.144 38.64 -0.25 -15.148
  [3,0,57,-0.25,-16,38.761,-0.25,-15.144,38.64,-0.25,-15.148],
// 4 0 29.696 -0.25 10.02 32.4 -0.25 7.316 34.896 -0.25 5.444 28.032 -0.25 12.308
  [4,0,29.696,-0.25,10.02,32.4,-0.25,7.316,34.896,-0.25,5.444,28.032,-0.25,12.308],
// 3 0 29.28 -0.25 4.196 34.896 -0.25 5.444 32.4 -0.25 7.316
  [3,0,29.28,-0.25,4.196,34.896,-0.25,5.444,32.4,-0.25,7.316],
// 3 0 57 -0.25 -16 39.029 -0.25 -15.113 38.761 -0.25 -15.144
  [3,0,57,-0.25,-16,39.029,-0.25,-15.113,38.761,-0.25,-15.144],
// 3 0 57 -0.25 -16 39.295 -0.25 -15.056 39.029 -0.25 -15.113
  [3,0,57,-0.25,-16,39.295,-0.25,-15.056,39.029,-0.25,-15.113],
// 4 0 6.192 -0.25 -6.412 6.192 -0.25 -8.076 34.896 -0.25 5.444 29.28 -0.25 4.196
  [4,0,6.192,-0.25,-6.412,6.192,-0.25,-8.076,34.896,-0.25,5.444,29.28,-0.25,4.196],
// 3 0 37.692 -0.25 5.728 35.728 -0.25 6.276 34.896 -0.25 5.444
  [3,0,37.692,-0.25,5.728,35.728,-0.25,6.276,34.896,-0.25,5.444],
// 3 0 57 -0.25 -16 39.539 -0.25 -14.976 39.295 -0.25 -15.056
  [3,0,57,-0.25,-16,39.539,-0.25,-14.976,39.295,-0.25,-15.056],
// 4 0 33.232 -0.25 10.02 35.728 -0.25 6.276 37.692 -0.25 5.728 41.968 -0.25 14.804
  [4,0,33.232,-0.25,10.02,35.728,-0.25,6.276,37.692,-0.25,5.728,41.968,-0.25,14.804],
// 3 0 57 -0.25 -16 39.74 -0.25 -14.887 39.539 -0.25 -14.976
  [3,0,57,-0.25,-16,39.74,-0.25,-14.887,39.539,-0.25,-14.976],
// 3 0 41.968 -0.25 14.804 33.232 -0.25 11.892 33.232 -0.25 10.02
  [3,0,41.968,-0.25,14.804,33.232,-0.25,11.892,33.232,-0.25,10.02],
// 3 0 57 -0.25 -16 39.89 -0.25 -14.803 39.74 -0.25 -14.887
  [3,0,57,-0.25,-16,39.89,-0.25,-14.803,39.74,-0.25,-14.887],
// 3 0 57 -0.25 -16 40.035 -0.25 -14.702 39.89 -0.25 -14.803
  [3,0,57,-0.25,-16,40.035,-0.25,-14.702,39.89,-0.25,-14.803],
// 3 0 57 -0.25 -16 40.173 -0.25 -14.584 40.035 -0.25 -14.702
  [3,0,57,-0.25,-16,40.173,-0.25,-14.584,40.035,-0.25,-14.702],
// 4 0 -3.792 -0.25 11.892 28.864 -0.25 13.14 41.968 -0.25 14.804 -3.792 -0.25 12.516
  [4,0,-3.792,-0.25,11.892,28.864,-0.25,13.14,41.968,-0.25,14.804,-3.792,-0.25,12.516],
// 3 0 57 -0.25 -16 40.3 -0.25 -14.447 40.173 -0.25 -14.584
  [3,0,57,-0.25,-16,40.3,-0.25,-14.447,40.173,-0.25,-14.584],
// 4 0 -57 -0.25 16 -41.968 -0.25 14.804 41.968 -0.25 14.804 57 -0.25 16
  [4,0,-57,-0.25,16,-41.968,-0.25,14.804,41.968,-0.25,14.804,57,-0.25,16],
// 3 0 57 -0.25 -16 40.414 -0.25 -14.288 40.3 -0.25 -14.447
  [3,0,57,-0.25,-16,40.414,-0.25,-14.288,40.3,-0.25,-14.447],
// 3 0 54.032 -0.25 14.804 57 -0.25 16 41.968 -0.25 14.804
  [3,0,54.032,-0.25,14.804,57,-0.25,16,41.968,-0.25,14.804],
// 3 0 57 -0.25 16 54.032 -0.25 14.804 52.123 -0.25 10.721
  [3,0,57,-0.25,16,54.032,-0.25,14.804,52.123,-0.25,10.721],
// 4 0 57 -0.25 16 52.123 -0.25 10.721 48.308 -0.25 2.563 57 -0.25 -16
  [4,0,57,-0.25,16,52.123,-0.25,10.721,48.308,-0.25,2.563,57,-0.25,-16],
// 3 0 57 -0.25 -16 40.512 -0.25 -14.108 40.414 -0.25 -14.288
  [3,0,57,-0.25,-16,40.512,-0.25,-14.108,40.414,-0.25,-14.288],
];
module ldraw_lib__193445a(step=0, col=false, unit=2/5, alt=false, line=0.2, solid=!$preview)
    makepoly(ldraw_lib__193445a(), step=step, col=col, unit=unit, alt=alt, line=line, solid=solid);
ldraw_lib__193445a(line=0.2);
